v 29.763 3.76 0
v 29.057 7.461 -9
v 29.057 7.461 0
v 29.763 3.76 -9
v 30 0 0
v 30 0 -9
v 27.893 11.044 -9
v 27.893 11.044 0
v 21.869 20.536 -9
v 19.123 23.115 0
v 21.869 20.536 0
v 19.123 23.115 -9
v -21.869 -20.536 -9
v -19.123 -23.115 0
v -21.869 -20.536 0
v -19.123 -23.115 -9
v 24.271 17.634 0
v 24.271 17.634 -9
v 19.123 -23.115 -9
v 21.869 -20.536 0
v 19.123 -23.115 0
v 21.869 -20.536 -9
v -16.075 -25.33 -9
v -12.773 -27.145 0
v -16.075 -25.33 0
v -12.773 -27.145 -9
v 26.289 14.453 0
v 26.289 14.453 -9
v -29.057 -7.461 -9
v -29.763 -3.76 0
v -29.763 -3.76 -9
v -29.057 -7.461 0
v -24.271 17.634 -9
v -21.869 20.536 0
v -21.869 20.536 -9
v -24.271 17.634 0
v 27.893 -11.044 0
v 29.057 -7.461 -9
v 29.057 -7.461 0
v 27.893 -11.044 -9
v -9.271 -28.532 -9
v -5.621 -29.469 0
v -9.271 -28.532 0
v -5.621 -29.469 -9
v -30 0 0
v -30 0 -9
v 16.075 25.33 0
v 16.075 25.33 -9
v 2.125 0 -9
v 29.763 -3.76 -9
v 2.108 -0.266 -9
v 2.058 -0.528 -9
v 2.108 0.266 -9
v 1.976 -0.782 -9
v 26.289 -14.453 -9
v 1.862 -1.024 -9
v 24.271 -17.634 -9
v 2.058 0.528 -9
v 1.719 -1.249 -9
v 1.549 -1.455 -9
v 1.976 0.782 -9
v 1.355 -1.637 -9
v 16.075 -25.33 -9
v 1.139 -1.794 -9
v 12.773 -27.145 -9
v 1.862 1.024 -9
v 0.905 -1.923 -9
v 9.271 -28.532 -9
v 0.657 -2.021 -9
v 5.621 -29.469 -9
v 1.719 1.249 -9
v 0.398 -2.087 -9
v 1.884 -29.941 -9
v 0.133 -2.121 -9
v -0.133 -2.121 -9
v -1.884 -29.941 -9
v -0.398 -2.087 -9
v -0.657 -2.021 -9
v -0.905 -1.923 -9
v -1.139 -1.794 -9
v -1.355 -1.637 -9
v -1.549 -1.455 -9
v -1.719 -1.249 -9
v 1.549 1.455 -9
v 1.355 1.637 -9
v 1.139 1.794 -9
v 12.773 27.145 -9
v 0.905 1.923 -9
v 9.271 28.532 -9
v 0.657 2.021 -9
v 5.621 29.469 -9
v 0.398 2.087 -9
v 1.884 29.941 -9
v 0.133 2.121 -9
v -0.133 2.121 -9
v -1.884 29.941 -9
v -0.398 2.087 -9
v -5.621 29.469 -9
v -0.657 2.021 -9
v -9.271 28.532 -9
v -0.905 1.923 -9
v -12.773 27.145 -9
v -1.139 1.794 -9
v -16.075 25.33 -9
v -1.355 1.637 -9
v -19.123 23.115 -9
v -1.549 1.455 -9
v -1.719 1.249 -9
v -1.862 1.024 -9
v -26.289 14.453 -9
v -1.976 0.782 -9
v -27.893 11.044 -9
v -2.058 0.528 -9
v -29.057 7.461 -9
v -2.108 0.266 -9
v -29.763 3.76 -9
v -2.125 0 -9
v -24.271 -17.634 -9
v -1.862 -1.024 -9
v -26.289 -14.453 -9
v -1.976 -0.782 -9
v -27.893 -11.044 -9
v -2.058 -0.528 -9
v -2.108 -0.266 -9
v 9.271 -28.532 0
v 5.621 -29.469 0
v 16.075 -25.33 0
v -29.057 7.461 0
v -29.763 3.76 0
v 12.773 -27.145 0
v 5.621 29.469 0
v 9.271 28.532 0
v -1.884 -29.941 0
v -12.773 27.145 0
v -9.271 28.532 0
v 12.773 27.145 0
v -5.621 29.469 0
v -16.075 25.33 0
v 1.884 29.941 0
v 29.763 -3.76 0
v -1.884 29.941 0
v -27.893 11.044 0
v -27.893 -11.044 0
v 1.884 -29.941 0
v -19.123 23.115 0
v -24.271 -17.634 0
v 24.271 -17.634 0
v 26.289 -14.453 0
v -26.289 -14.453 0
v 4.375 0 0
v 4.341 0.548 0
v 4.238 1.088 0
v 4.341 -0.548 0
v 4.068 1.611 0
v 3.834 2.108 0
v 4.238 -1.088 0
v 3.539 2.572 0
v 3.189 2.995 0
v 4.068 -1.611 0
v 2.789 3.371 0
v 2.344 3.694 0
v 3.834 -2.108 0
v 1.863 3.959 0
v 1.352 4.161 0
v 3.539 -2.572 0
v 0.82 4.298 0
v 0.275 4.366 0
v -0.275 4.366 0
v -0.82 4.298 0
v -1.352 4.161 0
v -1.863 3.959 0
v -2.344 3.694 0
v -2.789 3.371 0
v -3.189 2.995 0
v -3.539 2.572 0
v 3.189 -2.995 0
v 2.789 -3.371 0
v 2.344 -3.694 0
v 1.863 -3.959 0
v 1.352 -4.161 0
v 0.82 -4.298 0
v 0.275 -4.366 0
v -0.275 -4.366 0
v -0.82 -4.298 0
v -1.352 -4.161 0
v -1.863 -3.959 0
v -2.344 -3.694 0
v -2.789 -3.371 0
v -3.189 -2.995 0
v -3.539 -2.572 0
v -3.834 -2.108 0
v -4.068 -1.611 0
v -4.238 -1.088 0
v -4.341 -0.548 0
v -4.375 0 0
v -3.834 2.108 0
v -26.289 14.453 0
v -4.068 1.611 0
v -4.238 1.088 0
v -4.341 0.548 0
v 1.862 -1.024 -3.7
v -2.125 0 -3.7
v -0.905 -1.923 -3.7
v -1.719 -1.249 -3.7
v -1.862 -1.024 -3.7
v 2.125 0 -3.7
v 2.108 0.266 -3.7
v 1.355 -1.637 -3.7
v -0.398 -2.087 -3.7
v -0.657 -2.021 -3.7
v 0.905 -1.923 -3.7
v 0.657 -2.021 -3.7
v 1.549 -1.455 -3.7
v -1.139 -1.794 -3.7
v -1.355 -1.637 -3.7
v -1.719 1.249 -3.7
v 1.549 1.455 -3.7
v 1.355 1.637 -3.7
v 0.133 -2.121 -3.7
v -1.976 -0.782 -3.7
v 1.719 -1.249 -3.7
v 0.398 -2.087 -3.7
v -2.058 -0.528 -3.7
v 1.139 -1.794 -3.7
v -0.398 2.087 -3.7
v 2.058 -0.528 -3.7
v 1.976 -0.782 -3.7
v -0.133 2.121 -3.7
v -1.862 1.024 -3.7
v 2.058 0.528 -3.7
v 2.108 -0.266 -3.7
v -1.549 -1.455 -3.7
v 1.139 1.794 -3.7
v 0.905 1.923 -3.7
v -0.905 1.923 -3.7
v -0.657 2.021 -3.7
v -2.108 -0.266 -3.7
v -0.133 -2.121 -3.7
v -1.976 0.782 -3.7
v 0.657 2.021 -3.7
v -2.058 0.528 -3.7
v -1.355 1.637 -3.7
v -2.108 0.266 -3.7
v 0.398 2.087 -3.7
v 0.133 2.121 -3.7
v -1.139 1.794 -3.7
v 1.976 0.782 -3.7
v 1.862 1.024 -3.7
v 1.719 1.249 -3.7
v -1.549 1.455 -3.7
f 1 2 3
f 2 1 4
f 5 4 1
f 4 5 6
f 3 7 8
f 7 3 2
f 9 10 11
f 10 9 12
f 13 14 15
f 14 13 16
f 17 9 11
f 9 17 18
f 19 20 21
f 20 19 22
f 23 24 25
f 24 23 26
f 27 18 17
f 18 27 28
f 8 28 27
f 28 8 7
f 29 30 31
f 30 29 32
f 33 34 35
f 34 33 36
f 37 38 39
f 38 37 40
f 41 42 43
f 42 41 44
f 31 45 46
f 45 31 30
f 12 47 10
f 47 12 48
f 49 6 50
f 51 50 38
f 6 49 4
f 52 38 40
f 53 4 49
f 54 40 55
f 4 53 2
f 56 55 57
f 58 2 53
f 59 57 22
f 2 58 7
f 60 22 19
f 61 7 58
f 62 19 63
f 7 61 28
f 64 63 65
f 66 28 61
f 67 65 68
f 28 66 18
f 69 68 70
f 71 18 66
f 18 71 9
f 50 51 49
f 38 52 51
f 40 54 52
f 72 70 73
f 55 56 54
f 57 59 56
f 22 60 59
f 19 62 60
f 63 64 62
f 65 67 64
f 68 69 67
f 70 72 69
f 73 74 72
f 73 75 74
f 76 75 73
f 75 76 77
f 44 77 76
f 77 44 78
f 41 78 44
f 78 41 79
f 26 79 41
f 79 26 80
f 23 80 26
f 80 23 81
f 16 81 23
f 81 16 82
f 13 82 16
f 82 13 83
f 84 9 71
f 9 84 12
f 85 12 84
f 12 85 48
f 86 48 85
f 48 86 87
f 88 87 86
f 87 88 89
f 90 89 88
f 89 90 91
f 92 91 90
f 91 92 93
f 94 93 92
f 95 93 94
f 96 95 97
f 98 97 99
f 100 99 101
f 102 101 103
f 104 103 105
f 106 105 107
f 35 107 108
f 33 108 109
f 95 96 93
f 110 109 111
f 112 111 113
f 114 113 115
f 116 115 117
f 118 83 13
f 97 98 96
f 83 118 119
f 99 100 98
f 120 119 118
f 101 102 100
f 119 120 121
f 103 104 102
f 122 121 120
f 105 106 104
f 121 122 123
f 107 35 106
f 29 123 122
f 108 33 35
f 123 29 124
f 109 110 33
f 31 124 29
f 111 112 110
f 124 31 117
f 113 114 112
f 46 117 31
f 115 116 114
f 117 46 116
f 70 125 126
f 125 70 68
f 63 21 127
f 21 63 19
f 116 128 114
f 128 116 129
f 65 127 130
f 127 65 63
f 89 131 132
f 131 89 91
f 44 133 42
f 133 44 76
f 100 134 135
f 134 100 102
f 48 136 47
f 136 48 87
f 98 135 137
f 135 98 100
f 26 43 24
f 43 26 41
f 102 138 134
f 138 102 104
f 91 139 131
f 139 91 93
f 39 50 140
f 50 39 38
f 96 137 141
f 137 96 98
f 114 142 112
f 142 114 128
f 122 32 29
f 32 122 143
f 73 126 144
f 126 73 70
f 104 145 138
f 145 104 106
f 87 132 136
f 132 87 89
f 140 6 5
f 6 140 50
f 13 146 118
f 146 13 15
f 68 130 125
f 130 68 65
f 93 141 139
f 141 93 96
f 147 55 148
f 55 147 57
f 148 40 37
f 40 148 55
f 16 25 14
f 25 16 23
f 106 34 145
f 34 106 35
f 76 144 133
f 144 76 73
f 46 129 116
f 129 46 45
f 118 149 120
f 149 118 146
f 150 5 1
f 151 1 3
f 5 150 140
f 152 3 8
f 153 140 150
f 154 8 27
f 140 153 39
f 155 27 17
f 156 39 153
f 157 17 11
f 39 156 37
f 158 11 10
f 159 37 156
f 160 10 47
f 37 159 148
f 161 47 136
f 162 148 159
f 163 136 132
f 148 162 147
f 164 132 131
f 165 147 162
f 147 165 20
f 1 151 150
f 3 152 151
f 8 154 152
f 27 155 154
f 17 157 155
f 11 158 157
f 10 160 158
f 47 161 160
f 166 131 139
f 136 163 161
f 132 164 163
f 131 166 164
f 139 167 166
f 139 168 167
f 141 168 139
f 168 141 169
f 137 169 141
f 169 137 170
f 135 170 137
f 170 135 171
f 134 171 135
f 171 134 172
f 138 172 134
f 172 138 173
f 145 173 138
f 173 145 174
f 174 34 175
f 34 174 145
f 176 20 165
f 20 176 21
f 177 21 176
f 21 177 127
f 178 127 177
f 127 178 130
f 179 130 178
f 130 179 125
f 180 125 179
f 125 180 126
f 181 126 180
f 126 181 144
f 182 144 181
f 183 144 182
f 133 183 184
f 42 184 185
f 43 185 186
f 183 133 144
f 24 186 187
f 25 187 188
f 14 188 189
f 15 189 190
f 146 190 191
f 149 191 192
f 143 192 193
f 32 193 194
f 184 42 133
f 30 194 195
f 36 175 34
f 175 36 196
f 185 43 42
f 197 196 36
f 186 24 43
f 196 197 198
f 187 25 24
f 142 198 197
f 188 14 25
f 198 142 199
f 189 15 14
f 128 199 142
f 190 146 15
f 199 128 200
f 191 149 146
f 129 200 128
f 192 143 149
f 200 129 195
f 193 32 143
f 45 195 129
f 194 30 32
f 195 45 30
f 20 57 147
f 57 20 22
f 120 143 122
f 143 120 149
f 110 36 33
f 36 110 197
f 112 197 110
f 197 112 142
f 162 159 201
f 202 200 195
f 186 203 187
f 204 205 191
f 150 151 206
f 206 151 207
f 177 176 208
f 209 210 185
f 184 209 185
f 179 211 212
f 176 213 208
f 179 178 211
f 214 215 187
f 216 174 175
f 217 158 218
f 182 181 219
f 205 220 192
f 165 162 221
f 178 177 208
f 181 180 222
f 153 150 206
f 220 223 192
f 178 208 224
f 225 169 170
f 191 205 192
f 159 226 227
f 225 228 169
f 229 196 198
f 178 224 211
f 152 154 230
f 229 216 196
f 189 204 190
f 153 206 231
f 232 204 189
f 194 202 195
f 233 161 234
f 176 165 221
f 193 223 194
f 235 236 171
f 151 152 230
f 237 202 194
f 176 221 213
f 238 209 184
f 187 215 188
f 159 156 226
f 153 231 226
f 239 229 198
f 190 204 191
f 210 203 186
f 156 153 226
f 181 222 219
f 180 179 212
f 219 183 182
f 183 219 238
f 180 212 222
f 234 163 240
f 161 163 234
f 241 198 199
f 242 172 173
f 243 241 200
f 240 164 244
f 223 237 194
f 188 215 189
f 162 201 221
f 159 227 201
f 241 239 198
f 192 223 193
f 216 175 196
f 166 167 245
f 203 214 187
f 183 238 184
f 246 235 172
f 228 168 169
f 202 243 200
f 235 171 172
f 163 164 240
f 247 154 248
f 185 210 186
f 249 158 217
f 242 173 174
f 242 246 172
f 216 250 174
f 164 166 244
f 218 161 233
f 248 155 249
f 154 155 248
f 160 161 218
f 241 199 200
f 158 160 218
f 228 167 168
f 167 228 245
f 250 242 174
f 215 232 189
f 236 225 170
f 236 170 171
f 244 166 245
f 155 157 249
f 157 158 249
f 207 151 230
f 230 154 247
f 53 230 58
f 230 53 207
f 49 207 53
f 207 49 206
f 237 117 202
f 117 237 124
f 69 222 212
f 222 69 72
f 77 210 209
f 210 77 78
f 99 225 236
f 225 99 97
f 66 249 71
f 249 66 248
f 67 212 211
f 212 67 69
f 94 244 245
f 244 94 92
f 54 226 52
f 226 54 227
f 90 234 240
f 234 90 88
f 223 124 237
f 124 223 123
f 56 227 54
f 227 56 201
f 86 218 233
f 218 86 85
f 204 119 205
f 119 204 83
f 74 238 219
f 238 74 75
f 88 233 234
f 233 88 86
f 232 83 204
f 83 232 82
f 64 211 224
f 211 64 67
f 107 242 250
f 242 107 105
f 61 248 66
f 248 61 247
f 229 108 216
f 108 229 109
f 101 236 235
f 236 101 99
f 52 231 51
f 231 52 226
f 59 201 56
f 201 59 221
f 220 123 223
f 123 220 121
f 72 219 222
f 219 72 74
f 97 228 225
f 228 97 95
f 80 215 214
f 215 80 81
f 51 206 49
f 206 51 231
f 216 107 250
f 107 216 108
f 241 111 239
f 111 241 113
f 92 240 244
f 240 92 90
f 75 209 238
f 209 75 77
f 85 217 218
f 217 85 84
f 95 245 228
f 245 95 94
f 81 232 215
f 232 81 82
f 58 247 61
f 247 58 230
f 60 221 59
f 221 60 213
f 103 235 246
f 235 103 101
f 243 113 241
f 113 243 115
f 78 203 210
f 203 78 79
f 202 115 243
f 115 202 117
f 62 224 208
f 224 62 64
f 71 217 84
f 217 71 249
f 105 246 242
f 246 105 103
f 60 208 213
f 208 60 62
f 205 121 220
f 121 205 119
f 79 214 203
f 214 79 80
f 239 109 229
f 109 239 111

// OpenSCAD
$fn = 50;


difference() {
	union() {
		translate(v = [0, 0, -9.0000000000]) {
			cylinder(h = 9, r = 30.0000000000);
		}
		translate(v = [0, 0, -9.0000000000]) {
			cylinder(h = 9, r = 2.8750000000);
		}
	}
	union() {
		translate(v = [0, 0, 0]) {
			rotate(a = [0, 0, 0]) {
				difference() {
					union() {
						#translate(v = [0, 0, -9.0000000000]) {
							cylinder(h = 9, r = 2.0000000000);
						}
						#translate(v = [0, 0, -3.7000000000]) {
							cylinder(h = 3.7000000000, r1 = 2.1250000000, r2 = 4.3750000000);
						}
						#translate(v = [0, 0, -9.0000000000]) {
							cylinder(h = 9, r = 2.1250000000);
						}
						#translate(v = [0, 0, -9.0000000000]) {
							cylinder(h = 9, r = 2.0000000000);
						}
					}
					union();
				}
			}
		}
	}
}
